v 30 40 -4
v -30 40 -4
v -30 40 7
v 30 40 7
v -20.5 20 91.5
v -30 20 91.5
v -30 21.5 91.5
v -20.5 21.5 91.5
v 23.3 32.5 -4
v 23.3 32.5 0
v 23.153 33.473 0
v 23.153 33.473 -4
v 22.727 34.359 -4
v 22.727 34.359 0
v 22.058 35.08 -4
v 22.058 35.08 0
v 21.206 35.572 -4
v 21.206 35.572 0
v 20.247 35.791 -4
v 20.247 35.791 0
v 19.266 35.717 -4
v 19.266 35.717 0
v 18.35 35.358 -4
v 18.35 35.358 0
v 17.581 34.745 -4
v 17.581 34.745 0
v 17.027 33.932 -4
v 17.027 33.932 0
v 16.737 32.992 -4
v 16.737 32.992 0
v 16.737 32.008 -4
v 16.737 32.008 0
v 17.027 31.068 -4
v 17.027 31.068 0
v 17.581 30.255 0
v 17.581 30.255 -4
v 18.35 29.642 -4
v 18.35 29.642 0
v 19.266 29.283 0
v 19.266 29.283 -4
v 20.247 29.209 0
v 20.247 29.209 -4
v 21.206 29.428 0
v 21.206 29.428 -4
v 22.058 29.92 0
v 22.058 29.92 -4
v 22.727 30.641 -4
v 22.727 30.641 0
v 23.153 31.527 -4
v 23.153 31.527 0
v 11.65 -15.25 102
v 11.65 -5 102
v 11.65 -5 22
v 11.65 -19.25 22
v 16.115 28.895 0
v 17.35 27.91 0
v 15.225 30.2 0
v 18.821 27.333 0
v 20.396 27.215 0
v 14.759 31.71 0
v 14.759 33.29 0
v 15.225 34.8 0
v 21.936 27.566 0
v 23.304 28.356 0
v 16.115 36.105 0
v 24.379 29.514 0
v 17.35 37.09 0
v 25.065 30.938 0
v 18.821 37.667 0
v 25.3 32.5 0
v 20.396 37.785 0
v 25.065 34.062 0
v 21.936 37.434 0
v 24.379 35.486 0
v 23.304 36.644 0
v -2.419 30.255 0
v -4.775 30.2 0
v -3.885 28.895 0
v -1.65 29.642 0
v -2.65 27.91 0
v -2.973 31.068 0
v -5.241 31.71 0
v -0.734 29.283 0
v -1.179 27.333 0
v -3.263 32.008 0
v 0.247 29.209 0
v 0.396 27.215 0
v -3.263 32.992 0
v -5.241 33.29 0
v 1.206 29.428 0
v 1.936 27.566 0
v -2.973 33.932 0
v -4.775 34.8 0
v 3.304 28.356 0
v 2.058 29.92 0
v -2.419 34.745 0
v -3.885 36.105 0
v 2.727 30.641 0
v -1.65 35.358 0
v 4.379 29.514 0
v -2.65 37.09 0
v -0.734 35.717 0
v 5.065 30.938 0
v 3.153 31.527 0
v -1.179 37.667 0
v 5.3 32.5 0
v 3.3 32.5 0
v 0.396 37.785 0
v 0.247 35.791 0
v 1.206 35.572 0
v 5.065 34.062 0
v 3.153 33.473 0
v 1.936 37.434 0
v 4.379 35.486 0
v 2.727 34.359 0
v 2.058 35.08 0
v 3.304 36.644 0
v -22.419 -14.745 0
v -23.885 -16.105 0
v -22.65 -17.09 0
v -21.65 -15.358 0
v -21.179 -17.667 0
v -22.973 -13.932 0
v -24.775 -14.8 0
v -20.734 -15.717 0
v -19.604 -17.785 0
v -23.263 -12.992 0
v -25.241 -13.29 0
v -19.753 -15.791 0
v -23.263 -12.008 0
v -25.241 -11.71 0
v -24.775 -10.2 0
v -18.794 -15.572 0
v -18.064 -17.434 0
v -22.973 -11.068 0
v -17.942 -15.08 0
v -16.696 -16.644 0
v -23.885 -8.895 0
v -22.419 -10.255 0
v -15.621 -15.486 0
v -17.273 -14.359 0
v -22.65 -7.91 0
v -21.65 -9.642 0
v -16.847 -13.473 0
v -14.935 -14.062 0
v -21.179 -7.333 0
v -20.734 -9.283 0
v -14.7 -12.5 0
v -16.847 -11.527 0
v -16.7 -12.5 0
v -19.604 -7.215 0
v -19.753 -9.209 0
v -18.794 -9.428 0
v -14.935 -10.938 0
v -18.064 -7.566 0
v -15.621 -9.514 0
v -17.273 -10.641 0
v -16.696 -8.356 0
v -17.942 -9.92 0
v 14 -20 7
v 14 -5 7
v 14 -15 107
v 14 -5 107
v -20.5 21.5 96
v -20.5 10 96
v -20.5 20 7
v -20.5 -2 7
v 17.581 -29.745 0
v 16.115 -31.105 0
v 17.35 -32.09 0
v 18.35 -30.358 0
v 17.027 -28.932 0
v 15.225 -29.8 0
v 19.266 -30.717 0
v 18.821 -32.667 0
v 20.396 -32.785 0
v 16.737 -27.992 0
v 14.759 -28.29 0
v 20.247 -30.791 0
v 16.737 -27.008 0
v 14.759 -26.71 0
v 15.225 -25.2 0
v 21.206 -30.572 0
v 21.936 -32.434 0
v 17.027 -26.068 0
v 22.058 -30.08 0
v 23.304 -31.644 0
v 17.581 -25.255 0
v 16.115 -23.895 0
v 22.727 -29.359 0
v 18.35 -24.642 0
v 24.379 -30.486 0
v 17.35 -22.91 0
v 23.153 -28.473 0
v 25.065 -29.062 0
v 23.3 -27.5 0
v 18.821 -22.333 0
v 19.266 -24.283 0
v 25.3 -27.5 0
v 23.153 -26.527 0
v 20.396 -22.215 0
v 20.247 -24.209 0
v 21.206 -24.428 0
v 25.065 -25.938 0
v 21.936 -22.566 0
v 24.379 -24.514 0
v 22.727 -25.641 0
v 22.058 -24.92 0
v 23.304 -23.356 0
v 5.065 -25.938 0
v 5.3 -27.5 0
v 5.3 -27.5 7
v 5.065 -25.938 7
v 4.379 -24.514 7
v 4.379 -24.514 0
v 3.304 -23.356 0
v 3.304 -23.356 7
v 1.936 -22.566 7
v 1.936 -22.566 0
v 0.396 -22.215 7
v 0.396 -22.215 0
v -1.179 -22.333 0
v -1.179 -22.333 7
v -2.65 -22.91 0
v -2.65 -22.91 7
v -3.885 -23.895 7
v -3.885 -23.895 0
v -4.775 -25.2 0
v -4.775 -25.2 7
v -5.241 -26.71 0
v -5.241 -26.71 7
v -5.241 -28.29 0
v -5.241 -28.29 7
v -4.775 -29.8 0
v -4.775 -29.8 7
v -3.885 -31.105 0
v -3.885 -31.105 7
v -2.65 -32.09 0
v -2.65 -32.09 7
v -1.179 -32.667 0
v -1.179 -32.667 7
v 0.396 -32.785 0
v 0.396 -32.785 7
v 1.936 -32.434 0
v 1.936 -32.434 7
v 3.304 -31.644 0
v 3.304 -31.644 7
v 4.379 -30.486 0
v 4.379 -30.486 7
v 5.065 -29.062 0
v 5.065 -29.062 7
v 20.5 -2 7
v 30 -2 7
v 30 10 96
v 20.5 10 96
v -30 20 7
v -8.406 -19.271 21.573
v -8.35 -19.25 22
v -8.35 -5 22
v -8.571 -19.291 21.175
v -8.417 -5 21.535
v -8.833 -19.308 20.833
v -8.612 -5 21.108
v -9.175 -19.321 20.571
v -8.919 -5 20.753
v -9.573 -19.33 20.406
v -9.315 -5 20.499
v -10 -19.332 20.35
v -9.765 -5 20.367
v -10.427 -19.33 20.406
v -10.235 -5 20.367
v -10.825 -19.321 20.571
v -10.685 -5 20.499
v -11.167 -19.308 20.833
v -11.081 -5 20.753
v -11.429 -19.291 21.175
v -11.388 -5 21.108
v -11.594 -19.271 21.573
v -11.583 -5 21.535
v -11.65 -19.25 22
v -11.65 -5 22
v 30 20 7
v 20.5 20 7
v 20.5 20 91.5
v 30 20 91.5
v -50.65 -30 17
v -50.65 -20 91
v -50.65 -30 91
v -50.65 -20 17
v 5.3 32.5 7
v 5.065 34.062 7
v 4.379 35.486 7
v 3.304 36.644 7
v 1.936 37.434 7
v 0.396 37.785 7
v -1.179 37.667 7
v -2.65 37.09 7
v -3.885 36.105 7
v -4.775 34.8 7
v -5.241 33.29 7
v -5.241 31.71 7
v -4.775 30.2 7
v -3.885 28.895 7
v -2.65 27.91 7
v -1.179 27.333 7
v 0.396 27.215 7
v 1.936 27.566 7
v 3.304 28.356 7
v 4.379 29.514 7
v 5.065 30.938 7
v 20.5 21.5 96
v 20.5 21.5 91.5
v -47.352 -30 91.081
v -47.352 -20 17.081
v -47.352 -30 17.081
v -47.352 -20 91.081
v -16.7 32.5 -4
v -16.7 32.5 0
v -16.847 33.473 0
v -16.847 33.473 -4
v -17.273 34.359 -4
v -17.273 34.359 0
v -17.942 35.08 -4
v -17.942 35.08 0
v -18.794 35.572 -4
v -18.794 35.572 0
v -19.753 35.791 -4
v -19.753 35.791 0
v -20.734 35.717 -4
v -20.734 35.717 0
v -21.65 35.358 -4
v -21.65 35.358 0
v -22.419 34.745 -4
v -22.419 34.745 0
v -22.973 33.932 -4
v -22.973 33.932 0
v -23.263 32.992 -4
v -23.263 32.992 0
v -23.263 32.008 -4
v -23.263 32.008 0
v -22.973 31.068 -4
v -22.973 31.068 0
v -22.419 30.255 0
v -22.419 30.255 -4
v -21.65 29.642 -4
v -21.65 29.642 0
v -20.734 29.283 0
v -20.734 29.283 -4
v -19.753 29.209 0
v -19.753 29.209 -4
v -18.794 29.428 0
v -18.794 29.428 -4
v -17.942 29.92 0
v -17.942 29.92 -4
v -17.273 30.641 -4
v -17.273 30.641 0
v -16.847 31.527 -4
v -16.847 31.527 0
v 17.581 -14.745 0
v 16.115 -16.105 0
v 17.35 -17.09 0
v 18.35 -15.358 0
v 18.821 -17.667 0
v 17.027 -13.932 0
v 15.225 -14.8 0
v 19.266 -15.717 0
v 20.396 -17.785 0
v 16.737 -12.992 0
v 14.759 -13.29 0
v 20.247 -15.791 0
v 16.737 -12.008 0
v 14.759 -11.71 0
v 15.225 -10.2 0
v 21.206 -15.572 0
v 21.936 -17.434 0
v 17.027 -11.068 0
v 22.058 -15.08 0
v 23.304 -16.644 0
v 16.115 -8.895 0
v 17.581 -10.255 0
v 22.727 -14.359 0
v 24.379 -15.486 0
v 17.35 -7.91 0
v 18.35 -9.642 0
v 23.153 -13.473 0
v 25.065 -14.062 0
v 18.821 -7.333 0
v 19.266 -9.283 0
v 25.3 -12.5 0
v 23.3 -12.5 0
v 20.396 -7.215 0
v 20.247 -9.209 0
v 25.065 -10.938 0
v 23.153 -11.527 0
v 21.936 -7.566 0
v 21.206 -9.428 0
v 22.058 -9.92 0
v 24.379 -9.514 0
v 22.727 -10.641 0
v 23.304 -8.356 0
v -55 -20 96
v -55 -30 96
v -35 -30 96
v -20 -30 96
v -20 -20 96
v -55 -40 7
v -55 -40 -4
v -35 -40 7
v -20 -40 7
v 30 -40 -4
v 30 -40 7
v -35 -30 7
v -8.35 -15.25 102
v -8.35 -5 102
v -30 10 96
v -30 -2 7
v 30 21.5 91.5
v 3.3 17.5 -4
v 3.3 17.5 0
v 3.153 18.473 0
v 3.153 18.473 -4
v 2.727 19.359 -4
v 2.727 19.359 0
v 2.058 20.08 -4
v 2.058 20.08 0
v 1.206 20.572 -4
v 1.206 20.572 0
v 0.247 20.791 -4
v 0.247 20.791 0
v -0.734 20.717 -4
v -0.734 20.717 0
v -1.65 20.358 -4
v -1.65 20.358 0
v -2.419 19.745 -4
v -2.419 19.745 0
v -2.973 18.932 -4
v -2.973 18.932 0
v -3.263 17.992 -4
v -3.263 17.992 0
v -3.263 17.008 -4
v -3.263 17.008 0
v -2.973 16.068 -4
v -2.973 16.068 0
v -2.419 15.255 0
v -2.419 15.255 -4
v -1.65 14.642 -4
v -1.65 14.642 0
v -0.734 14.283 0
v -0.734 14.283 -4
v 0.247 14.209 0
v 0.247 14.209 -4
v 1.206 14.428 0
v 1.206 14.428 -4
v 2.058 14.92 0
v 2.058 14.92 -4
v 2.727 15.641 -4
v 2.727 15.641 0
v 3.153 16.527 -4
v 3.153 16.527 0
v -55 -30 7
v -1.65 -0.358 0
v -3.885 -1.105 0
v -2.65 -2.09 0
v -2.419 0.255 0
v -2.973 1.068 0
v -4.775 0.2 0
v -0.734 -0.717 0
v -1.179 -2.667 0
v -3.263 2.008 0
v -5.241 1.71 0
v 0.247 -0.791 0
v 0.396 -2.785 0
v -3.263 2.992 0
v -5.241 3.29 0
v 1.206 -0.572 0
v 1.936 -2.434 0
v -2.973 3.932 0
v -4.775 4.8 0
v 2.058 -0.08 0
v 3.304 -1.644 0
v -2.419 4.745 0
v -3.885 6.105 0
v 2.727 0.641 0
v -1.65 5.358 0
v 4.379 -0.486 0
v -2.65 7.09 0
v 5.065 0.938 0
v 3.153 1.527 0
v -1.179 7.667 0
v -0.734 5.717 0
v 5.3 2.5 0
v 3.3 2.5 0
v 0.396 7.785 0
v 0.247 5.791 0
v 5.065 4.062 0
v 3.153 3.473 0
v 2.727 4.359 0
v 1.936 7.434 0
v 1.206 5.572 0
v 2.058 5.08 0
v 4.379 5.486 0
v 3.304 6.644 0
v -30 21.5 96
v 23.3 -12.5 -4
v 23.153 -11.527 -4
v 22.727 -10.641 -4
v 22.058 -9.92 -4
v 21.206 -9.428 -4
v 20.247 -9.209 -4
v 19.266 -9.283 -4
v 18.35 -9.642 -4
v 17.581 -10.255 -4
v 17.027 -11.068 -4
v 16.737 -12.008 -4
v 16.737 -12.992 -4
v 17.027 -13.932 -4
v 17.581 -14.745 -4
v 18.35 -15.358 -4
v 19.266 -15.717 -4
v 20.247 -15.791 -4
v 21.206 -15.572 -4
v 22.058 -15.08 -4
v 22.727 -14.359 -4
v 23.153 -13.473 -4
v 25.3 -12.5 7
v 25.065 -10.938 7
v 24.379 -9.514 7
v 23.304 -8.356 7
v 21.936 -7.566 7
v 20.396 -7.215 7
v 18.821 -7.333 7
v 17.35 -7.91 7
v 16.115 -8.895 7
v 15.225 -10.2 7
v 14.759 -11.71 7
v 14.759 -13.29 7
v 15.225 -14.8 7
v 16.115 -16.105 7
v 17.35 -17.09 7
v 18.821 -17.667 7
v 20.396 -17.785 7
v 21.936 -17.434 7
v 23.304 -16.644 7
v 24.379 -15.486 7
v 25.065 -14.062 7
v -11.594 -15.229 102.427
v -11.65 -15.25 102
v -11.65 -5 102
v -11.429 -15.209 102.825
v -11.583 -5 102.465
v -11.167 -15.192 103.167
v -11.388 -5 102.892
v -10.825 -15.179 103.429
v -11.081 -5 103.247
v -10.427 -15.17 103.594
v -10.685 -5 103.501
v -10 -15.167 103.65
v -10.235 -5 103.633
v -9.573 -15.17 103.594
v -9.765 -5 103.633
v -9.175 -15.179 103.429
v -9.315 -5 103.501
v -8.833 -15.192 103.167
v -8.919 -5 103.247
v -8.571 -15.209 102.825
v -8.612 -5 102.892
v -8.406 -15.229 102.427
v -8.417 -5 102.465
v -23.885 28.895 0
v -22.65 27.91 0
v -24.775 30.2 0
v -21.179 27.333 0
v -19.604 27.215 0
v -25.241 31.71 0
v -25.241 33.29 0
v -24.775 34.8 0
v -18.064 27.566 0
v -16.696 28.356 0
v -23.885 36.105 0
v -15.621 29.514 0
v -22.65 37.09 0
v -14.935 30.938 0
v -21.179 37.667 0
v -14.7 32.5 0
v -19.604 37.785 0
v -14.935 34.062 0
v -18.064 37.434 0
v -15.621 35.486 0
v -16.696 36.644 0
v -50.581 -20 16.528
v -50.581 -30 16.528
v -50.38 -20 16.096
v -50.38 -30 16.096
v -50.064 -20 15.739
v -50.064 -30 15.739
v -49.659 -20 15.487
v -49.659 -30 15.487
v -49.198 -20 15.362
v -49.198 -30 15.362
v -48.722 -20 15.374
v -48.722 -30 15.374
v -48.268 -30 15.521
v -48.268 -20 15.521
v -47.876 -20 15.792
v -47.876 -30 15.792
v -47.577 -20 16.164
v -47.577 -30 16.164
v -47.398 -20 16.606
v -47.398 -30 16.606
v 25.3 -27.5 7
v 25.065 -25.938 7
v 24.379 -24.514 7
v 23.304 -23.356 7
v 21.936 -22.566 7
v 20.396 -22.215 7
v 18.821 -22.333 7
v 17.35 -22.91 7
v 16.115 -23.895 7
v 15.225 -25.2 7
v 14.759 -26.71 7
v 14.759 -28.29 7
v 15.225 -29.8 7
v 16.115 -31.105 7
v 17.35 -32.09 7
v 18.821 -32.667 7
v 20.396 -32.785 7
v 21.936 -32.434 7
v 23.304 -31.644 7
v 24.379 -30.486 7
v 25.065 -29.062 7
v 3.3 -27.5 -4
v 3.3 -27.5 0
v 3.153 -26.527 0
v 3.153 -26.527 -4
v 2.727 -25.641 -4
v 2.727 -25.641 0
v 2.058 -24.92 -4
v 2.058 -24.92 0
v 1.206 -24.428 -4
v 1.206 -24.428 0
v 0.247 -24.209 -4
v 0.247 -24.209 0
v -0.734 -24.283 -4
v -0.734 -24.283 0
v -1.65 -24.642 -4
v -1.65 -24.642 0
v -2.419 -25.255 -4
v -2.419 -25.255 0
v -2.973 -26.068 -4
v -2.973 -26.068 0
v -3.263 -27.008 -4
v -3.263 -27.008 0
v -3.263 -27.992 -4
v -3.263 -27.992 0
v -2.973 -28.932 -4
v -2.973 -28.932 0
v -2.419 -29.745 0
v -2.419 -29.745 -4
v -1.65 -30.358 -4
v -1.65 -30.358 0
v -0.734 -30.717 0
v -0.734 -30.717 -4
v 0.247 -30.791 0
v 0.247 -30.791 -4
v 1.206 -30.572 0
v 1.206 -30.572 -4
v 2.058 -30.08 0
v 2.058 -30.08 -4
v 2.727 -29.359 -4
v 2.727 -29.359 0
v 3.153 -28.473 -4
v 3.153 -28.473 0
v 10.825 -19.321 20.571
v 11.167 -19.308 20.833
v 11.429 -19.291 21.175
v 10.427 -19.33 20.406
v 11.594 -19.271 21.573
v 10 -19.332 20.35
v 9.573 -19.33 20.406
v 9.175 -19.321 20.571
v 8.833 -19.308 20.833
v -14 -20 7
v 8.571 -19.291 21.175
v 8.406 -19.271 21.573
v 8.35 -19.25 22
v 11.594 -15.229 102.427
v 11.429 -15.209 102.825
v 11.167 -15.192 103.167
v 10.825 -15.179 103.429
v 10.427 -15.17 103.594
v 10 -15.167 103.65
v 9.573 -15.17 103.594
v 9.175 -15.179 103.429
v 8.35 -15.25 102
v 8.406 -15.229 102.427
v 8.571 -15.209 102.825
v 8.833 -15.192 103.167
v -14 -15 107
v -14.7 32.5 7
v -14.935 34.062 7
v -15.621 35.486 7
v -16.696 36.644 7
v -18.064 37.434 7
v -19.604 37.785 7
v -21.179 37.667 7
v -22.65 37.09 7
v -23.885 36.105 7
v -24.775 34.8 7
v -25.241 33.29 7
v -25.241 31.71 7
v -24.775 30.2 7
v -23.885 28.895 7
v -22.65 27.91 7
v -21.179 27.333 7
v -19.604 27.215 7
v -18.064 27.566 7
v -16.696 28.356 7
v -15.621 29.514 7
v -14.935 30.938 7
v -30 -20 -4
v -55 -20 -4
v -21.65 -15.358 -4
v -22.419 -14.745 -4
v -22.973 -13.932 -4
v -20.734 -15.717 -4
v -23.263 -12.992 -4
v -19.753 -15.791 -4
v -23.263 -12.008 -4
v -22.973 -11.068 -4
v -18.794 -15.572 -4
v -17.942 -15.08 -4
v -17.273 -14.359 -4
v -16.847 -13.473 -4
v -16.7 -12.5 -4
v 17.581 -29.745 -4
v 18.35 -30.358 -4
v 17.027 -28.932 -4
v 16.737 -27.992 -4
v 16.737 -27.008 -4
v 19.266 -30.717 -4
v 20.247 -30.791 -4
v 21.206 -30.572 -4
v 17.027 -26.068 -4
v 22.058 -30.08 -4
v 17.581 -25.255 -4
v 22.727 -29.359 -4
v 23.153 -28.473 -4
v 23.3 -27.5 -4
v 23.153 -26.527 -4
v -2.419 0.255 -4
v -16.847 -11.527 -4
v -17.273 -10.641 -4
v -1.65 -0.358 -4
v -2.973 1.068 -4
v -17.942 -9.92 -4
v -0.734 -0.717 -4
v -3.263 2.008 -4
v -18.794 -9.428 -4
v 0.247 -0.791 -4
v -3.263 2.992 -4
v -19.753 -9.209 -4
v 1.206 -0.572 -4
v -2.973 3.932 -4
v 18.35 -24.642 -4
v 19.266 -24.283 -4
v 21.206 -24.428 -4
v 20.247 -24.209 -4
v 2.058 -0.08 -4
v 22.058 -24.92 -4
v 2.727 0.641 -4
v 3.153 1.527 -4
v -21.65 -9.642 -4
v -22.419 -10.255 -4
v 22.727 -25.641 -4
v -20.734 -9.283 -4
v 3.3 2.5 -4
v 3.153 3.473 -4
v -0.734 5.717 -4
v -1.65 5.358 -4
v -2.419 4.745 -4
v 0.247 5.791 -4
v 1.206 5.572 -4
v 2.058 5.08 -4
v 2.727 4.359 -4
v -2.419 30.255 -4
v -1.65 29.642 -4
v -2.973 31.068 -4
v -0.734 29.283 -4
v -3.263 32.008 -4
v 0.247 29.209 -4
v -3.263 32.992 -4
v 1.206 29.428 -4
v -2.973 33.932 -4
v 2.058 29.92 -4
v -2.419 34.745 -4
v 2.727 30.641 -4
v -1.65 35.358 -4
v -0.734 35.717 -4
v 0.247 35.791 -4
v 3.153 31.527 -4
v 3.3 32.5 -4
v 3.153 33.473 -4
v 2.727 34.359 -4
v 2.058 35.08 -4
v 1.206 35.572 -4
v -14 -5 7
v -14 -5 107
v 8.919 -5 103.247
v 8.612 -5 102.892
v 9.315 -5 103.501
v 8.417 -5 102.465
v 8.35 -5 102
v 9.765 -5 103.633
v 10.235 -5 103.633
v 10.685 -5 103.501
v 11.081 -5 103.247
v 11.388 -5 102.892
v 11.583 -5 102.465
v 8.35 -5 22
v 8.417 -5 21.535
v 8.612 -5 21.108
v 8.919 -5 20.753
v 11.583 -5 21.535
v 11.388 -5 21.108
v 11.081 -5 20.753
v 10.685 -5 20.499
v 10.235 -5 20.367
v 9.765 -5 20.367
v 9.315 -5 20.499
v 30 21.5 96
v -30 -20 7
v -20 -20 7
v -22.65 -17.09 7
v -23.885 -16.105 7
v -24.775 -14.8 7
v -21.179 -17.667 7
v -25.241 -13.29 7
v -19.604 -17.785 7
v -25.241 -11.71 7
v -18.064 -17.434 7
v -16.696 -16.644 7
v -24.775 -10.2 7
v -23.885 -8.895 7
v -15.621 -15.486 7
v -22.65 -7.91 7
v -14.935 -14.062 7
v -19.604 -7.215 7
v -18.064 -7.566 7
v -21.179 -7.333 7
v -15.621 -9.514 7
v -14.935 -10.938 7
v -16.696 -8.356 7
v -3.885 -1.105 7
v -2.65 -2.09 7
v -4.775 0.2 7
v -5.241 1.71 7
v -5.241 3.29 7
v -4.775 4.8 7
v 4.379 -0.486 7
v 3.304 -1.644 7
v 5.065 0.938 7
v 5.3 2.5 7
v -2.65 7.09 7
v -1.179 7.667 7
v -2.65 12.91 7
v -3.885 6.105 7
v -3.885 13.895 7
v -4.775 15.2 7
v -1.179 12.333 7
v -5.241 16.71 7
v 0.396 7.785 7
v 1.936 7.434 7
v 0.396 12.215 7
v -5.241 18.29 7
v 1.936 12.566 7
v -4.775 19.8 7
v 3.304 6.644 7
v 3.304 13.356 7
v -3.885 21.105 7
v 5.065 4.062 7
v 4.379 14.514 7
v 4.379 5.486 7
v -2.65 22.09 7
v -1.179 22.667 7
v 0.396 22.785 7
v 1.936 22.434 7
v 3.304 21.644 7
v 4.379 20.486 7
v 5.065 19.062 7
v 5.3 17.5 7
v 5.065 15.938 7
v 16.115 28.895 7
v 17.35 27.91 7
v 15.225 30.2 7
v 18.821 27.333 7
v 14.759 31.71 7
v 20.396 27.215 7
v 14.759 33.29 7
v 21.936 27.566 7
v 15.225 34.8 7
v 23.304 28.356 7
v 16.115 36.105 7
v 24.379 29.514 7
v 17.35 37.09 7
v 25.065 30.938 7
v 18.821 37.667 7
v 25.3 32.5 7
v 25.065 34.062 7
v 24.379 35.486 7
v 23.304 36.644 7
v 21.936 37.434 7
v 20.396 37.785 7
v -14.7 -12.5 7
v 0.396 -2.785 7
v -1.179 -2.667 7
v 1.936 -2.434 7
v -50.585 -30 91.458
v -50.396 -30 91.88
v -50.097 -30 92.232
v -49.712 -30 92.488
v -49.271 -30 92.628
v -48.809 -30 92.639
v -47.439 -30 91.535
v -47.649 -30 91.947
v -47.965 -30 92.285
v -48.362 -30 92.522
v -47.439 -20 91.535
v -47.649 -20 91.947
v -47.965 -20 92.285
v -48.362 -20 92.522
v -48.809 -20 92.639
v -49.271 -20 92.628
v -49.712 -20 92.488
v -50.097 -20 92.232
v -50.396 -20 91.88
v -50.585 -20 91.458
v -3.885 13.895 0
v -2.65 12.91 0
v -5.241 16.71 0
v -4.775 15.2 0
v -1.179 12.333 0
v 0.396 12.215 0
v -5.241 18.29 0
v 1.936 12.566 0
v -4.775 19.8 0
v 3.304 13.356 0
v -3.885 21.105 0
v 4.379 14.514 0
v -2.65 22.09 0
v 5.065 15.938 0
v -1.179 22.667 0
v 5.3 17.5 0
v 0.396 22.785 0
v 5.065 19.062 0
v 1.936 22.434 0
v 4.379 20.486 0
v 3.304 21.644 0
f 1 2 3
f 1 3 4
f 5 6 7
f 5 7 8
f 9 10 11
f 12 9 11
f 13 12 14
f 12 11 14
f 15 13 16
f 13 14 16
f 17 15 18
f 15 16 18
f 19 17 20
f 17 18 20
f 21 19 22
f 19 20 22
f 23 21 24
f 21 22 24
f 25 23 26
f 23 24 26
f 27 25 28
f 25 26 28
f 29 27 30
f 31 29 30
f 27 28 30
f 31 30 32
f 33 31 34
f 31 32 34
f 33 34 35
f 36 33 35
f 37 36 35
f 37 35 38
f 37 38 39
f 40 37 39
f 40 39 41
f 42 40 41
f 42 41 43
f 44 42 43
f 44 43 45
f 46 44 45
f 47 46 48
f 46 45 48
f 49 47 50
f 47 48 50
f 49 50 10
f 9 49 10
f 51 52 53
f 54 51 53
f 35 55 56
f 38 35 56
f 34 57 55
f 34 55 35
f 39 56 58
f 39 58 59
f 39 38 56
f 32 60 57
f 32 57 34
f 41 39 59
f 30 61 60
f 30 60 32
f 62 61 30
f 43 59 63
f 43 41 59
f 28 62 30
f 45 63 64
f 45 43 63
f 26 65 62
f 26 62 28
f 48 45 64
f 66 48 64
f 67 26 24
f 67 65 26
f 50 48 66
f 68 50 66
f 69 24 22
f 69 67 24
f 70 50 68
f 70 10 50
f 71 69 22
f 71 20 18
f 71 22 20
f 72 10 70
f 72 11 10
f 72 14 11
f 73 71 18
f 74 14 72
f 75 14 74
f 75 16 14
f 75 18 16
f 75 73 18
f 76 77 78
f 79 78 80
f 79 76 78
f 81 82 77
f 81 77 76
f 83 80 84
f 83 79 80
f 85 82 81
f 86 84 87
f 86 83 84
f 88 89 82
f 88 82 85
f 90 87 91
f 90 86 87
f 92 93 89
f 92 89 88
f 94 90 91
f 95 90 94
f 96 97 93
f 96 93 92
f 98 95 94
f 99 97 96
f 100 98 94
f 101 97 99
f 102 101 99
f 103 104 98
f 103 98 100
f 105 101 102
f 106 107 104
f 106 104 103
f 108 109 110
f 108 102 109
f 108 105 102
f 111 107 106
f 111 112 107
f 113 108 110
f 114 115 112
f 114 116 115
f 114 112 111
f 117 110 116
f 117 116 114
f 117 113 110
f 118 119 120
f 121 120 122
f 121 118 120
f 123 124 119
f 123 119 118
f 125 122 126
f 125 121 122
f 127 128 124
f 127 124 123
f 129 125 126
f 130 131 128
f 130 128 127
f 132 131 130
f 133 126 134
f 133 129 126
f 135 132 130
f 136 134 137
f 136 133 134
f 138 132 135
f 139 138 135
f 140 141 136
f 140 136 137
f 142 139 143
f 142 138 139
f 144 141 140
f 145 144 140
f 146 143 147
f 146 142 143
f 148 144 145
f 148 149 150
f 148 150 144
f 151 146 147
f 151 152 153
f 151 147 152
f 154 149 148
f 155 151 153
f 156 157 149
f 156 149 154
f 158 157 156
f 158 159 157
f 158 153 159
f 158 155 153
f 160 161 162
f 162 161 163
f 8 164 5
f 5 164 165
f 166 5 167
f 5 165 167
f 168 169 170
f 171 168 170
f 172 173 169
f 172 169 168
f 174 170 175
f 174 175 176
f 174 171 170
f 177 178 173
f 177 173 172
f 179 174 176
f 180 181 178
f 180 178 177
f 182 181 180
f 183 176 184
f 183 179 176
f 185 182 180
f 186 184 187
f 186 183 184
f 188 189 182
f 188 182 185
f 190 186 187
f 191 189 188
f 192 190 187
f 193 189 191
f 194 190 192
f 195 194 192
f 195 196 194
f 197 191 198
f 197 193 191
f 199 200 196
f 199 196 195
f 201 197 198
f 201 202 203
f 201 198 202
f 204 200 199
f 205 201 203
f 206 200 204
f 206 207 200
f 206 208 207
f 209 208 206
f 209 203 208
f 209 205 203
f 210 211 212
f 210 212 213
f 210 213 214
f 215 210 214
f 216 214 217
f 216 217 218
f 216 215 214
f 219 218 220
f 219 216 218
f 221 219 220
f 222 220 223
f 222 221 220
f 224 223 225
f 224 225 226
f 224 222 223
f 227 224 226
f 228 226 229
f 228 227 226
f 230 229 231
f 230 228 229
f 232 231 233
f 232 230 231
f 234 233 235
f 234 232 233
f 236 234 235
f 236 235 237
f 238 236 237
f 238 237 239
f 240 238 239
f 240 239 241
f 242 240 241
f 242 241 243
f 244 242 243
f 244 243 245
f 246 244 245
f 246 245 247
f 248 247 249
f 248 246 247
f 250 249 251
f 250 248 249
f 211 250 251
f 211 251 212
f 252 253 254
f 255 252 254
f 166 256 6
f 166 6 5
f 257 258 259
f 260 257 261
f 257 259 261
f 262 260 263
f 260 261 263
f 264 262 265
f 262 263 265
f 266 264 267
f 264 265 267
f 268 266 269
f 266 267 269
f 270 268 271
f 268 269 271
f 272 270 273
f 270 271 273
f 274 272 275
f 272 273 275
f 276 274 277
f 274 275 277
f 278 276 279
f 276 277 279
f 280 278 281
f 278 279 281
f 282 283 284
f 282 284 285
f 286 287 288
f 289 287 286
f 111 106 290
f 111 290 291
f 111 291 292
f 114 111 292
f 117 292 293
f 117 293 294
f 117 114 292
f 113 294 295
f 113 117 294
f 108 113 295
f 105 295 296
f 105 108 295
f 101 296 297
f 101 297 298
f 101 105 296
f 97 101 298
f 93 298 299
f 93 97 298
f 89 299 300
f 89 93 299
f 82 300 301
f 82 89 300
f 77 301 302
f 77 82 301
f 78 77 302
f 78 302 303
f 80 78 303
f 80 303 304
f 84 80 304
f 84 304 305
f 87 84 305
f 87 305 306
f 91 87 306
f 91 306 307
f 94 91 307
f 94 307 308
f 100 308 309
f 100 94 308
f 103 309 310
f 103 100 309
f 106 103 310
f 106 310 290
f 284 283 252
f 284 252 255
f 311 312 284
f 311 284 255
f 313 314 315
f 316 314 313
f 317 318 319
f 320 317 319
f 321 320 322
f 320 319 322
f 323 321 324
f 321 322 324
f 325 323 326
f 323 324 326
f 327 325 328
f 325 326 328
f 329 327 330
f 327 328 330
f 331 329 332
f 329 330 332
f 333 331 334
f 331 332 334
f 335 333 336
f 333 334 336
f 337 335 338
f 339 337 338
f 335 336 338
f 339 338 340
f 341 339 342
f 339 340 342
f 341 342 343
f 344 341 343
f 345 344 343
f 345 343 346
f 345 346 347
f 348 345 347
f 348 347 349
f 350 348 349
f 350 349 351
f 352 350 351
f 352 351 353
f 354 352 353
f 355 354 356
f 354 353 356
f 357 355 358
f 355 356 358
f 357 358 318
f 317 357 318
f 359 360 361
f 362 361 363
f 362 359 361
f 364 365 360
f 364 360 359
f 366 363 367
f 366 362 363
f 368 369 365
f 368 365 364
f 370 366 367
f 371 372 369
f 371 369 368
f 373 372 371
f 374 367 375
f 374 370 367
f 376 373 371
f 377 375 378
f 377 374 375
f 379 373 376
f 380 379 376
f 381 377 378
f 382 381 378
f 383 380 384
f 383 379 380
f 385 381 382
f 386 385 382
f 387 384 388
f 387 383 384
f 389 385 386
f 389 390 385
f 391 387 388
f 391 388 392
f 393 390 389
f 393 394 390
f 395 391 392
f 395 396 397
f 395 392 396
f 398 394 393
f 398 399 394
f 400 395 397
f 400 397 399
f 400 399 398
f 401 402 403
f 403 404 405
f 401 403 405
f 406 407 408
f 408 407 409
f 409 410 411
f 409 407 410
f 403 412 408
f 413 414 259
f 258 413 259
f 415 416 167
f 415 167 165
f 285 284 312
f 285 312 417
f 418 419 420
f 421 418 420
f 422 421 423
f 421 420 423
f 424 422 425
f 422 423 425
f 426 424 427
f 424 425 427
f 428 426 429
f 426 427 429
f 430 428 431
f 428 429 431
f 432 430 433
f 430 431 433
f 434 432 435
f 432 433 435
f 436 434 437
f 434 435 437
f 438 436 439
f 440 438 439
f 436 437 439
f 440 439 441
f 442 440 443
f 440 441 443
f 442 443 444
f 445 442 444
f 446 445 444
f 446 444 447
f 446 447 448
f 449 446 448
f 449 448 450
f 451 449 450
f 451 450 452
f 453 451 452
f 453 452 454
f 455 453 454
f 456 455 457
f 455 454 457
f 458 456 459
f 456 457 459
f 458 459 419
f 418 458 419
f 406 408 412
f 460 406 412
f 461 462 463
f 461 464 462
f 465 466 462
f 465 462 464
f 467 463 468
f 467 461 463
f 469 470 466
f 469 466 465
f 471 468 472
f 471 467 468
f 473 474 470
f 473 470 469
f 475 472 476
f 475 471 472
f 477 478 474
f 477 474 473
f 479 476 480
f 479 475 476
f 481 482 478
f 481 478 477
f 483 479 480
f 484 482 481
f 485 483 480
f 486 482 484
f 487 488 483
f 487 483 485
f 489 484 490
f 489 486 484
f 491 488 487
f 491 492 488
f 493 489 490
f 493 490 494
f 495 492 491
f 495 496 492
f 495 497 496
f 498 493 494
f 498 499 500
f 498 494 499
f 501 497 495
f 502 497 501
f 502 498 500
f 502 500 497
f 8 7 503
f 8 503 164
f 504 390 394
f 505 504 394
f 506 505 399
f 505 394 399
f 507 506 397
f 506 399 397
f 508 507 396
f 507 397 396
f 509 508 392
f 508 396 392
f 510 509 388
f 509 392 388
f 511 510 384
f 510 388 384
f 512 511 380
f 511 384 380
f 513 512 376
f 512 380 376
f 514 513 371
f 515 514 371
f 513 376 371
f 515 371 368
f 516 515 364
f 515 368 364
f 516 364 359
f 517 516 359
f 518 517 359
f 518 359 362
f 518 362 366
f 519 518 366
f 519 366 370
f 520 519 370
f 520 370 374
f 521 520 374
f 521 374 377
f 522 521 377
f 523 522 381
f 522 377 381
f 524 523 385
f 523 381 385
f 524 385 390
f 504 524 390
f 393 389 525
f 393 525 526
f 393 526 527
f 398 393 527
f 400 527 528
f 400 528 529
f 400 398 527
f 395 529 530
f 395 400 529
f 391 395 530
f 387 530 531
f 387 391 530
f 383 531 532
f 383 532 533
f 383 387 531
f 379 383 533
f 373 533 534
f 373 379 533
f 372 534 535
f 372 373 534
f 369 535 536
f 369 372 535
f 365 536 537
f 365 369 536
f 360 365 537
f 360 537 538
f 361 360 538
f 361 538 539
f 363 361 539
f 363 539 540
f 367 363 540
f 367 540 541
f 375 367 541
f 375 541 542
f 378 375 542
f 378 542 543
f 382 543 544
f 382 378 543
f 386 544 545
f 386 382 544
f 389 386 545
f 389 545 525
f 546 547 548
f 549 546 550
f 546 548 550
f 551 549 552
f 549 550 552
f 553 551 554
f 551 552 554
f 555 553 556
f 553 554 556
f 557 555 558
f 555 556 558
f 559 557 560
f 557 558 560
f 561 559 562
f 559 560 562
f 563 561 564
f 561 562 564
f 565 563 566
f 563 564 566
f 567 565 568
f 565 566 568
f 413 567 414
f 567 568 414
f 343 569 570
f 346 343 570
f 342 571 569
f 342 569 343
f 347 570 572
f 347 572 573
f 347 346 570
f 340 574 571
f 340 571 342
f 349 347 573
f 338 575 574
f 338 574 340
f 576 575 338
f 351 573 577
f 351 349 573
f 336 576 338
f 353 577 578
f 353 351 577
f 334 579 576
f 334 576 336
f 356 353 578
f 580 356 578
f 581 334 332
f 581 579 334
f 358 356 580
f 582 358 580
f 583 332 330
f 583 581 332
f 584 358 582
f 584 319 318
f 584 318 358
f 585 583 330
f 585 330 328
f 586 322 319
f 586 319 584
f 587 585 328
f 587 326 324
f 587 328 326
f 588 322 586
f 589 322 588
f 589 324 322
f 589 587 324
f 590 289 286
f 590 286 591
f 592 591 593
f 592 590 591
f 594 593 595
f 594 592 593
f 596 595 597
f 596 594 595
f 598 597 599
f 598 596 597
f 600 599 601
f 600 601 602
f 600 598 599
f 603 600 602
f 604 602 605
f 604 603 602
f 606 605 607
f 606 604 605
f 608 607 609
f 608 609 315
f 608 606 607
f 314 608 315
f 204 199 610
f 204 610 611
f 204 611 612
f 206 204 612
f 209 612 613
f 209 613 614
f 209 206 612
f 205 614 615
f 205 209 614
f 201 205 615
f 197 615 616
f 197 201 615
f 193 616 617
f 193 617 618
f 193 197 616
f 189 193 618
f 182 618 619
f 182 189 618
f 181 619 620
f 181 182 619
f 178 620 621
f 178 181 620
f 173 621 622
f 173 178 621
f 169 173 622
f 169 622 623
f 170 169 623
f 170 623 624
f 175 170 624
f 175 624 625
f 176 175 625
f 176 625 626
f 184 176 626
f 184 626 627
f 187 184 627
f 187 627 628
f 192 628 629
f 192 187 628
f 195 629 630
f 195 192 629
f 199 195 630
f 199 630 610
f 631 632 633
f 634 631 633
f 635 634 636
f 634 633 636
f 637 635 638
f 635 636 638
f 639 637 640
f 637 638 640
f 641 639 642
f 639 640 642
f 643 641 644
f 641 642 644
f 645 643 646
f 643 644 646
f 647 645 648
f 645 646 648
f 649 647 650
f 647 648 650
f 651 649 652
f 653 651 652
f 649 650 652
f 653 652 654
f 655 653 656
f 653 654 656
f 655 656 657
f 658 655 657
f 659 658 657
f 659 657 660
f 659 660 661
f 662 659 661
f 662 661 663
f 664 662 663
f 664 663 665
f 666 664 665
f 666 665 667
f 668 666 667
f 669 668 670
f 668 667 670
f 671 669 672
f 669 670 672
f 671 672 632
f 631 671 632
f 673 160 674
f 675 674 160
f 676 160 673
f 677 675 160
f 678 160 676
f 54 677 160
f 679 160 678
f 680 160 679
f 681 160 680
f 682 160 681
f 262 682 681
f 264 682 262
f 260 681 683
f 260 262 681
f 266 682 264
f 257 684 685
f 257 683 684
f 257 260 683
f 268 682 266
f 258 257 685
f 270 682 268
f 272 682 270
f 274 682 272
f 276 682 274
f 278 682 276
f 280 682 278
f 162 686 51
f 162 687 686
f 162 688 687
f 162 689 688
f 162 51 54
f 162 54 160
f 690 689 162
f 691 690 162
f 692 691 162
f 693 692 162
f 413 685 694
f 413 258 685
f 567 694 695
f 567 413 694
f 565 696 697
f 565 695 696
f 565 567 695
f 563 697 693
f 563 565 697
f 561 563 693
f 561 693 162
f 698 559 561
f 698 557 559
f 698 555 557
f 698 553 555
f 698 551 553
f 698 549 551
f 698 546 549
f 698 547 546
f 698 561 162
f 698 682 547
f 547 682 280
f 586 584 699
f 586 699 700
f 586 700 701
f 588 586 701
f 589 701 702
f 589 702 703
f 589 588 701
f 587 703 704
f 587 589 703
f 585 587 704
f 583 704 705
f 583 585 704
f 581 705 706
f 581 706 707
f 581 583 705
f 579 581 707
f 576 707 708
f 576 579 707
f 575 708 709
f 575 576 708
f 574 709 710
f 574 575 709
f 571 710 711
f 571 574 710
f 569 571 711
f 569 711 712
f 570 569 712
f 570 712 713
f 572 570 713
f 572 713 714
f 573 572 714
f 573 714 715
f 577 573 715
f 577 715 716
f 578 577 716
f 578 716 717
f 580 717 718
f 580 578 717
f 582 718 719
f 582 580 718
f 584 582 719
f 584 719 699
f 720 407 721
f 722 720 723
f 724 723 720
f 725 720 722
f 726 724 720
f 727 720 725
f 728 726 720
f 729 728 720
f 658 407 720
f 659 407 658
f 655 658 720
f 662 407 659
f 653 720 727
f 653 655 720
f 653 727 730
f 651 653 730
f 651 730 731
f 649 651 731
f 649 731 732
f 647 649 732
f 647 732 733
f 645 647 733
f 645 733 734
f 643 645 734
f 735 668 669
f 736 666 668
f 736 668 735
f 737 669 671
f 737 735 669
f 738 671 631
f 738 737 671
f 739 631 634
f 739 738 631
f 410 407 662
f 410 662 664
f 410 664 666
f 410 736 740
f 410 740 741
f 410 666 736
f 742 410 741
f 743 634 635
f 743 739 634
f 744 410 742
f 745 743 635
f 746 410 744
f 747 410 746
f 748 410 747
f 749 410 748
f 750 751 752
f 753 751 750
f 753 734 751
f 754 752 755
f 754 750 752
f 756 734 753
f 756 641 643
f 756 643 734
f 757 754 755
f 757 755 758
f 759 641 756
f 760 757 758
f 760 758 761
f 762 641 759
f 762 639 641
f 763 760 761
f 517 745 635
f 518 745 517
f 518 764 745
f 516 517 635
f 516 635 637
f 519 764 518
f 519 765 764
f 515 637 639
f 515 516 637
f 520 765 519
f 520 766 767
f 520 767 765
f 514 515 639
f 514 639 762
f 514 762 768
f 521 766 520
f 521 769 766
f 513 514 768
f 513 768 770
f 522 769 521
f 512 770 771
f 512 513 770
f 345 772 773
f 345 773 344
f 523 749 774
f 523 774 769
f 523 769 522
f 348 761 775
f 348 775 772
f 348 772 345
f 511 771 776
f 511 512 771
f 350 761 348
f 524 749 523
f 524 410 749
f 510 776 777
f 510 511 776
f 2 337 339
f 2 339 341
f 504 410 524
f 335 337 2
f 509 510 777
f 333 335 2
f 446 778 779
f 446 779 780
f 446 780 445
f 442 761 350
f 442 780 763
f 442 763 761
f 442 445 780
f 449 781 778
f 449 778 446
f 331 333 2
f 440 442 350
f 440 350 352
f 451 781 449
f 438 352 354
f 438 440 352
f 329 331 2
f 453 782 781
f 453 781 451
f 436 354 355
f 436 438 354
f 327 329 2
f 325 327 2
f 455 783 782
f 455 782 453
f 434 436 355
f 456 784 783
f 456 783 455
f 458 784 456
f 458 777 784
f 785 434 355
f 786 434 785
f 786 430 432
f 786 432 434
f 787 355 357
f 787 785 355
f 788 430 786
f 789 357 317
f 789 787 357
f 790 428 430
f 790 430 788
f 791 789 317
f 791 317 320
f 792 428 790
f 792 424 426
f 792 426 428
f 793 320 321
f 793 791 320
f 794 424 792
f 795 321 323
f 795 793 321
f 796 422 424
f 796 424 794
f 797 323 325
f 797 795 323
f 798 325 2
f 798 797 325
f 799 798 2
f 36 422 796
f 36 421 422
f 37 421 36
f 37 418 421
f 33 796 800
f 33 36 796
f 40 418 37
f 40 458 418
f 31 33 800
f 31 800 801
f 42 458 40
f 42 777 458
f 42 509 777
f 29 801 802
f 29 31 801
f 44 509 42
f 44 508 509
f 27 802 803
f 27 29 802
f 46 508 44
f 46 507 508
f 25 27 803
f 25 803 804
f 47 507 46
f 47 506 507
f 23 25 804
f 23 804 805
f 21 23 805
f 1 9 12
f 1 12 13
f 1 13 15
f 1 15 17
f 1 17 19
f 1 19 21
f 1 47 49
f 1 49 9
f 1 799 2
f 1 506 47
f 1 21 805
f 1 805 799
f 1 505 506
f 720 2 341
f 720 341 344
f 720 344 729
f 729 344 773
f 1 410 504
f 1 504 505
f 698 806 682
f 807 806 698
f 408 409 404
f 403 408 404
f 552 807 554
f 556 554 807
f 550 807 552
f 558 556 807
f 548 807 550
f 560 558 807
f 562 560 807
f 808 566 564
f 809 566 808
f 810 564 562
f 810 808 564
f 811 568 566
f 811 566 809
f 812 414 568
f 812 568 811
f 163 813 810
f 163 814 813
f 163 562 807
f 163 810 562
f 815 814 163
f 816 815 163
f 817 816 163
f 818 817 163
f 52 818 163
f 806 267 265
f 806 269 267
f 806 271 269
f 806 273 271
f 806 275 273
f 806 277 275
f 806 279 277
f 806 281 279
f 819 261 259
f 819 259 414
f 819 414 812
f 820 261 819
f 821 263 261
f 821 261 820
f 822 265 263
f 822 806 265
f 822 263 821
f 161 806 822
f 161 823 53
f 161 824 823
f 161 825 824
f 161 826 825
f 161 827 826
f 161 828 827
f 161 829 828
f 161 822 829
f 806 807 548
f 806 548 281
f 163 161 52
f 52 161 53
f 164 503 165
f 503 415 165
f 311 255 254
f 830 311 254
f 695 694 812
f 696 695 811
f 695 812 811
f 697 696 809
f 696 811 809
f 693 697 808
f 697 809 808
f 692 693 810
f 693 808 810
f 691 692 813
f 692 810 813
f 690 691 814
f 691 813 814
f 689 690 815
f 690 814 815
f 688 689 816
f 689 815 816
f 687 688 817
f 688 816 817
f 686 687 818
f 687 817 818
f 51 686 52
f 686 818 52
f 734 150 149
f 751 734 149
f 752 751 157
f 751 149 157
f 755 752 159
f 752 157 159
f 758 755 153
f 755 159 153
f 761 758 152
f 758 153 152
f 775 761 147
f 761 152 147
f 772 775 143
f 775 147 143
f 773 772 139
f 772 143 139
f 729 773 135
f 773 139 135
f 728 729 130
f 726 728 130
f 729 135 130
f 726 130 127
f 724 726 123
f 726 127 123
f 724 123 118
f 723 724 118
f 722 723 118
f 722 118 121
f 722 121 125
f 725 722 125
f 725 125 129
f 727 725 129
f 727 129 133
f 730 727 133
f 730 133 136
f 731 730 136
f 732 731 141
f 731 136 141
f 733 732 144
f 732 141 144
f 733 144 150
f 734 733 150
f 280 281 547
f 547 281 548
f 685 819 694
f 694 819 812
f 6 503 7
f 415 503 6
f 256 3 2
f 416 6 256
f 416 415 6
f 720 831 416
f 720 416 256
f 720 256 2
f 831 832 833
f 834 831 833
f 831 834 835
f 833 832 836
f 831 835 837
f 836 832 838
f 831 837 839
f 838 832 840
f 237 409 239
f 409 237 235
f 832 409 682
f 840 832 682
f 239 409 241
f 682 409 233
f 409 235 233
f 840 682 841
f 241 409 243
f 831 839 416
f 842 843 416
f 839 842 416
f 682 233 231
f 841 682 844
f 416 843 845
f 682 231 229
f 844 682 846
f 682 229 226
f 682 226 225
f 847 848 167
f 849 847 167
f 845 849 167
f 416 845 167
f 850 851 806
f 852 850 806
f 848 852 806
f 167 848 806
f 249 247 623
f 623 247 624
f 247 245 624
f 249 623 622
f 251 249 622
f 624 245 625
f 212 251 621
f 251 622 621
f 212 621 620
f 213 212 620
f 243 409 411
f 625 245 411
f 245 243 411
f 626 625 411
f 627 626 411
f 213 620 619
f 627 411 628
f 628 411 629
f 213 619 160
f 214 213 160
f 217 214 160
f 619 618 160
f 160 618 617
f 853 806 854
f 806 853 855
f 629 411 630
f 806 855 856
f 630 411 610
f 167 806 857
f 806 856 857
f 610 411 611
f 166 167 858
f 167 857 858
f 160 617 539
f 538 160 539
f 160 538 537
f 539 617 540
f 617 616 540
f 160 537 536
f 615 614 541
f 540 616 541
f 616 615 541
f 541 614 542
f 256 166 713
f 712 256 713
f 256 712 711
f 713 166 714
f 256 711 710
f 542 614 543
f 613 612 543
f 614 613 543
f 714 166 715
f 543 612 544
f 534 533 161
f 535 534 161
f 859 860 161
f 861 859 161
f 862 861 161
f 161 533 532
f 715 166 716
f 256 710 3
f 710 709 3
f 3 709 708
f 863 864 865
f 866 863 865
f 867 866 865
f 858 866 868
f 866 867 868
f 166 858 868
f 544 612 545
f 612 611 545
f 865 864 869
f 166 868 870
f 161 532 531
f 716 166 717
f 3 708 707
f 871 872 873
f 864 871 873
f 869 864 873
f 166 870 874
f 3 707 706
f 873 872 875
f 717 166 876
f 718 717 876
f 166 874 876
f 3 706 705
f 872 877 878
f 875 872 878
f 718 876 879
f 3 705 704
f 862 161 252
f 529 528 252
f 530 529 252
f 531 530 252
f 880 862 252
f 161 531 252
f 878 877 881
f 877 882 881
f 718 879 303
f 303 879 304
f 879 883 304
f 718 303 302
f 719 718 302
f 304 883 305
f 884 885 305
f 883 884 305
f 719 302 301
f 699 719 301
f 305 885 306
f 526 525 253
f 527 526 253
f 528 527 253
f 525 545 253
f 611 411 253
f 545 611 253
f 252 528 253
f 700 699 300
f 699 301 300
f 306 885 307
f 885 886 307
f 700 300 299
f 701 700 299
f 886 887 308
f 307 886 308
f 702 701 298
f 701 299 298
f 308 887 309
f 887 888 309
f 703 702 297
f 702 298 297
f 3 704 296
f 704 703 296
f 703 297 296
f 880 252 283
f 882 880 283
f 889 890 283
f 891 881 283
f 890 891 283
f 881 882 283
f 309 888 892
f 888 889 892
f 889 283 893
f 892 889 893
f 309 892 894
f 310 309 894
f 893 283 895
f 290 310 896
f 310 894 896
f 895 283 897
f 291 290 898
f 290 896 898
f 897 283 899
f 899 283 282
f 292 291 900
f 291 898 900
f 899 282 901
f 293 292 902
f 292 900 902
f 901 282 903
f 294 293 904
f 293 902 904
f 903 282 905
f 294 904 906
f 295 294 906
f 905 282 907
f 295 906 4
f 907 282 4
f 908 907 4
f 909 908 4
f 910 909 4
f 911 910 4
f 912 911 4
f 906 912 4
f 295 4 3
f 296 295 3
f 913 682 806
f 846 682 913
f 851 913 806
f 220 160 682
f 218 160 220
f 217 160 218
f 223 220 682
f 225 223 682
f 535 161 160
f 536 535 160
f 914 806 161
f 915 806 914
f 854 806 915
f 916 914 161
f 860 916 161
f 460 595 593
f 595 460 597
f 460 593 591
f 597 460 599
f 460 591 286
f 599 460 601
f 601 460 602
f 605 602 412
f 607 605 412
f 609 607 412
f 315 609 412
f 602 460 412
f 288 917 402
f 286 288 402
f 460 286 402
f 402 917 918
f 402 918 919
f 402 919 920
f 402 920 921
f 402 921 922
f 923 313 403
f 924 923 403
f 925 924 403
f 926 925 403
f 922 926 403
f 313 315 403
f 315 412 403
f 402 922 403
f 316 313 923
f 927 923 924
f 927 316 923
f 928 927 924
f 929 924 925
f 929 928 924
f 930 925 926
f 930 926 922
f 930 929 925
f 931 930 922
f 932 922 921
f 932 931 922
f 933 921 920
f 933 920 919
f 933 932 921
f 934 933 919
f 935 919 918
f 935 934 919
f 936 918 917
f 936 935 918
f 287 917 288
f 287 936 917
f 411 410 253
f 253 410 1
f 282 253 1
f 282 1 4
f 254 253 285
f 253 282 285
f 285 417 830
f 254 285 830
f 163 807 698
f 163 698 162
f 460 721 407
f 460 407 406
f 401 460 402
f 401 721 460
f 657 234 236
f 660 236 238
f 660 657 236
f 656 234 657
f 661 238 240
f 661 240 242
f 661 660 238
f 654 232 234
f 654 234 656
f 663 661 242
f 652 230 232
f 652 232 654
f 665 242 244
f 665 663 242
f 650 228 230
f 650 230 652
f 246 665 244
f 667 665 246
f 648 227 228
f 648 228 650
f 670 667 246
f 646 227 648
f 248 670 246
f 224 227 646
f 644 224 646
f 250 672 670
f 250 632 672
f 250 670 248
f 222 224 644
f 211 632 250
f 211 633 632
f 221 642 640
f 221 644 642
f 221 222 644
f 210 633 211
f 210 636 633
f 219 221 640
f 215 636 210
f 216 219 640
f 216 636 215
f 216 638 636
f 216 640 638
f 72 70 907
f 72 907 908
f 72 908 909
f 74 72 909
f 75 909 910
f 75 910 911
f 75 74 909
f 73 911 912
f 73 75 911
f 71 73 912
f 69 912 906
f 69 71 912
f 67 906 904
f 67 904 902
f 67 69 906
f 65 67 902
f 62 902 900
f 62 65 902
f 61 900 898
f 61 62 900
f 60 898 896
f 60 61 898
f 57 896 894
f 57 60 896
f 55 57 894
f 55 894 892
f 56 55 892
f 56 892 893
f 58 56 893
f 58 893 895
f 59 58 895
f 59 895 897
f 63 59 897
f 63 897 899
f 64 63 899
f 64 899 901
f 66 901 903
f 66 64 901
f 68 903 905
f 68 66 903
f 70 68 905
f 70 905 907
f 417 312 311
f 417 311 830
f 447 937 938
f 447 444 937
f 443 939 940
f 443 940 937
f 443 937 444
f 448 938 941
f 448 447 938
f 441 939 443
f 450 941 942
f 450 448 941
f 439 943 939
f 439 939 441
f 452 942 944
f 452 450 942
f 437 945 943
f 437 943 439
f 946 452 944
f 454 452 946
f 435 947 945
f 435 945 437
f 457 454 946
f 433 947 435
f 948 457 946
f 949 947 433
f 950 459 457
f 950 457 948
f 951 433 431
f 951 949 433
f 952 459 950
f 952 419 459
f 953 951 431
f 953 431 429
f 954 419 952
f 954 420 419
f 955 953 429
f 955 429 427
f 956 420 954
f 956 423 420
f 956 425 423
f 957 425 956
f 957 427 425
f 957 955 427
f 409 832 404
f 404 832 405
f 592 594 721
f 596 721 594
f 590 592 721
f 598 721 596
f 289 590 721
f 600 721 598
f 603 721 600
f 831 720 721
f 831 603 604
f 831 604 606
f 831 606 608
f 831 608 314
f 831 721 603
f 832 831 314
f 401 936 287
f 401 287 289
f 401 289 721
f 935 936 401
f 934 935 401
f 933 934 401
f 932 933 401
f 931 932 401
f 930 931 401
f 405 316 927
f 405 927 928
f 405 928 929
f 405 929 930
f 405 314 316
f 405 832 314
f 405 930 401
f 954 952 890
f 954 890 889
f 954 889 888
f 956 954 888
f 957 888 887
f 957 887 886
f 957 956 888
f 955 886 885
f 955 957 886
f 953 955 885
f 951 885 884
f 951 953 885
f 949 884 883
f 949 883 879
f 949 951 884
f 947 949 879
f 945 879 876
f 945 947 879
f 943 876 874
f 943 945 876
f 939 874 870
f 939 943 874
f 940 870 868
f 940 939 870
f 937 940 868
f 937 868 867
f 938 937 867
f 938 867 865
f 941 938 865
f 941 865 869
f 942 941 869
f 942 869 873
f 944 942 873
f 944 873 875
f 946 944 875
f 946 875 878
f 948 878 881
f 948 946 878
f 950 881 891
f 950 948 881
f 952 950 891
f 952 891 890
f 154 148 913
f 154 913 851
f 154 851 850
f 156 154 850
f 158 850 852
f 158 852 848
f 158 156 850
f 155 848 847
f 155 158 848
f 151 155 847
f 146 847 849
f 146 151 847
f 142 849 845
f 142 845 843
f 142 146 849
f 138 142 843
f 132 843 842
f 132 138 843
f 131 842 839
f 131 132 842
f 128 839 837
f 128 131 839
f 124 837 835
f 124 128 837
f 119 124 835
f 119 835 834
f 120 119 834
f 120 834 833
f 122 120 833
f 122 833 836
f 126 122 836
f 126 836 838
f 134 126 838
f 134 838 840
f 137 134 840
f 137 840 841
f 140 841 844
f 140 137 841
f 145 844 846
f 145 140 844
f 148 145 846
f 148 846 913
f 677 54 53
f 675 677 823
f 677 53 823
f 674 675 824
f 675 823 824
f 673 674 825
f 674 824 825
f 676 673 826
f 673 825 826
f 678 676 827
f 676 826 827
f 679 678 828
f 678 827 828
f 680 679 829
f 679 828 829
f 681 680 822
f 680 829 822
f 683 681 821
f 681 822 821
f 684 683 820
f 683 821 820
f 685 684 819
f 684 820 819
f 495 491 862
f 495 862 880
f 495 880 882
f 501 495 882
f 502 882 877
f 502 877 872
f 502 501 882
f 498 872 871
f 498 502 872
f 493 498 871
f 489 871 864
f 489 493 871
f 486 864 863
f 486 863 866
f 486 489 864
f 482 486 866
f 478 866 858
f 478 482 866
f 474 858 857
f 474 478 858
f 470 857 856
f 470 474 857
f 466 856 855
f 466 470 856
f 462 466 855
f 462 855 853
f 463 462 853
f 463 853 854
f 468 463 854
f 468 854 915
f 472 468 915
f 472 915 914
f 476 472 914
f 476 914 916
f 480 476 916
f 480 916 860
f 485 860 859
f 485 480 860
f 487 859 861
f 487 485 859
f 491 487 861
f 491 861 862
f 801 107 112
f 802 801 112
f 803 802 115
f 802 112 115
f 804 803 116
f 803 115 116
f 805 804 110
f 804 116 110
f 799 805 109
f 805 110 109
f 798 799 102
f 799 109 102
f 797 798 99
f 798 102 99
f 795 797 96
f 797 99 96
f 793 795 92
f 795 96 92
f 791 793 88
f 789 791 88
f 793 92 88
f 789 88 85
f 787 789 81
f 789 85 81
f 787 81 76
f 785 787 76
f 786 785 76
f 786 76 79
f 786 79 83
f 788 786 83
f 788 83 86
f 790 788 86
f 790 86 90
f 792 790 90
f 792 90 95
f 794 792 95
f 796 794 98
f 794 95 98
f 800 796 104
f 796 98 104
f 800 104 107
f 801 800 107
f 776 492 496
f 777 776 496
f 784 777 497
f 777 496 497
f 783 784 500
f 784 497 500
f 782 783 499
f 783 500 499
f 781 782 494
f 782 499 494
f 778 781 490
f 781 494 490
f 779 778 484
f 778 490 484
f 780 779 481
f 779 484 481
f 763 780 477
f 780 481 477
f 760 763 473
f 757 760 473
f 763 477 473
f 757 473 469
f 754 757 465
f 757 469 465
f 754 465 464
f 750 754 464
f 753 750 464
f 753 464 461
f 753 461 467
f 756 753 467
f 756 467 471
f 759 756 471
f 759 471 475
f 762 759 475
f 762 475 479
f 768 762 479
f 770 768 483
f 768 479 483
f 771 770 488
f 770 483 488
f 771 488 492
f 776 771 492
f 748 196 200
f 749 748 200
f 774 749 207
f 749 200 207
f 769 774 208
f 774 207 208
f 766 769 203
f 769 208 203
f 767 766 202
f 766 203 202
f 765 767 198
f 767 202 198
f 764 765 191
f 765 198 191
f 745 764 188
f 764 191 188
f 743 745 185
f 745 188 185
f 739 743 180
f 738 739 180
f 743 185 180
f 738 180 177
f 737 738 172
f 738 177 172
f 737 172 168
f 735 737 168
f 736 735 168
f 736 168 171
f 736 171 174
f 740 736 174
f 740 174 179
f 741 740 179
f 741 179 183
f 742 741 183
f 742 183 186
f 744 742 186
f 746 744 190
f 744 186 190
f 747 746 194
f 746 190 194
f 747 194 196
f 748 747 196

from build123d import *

# Parameters (mm, degrees)
SKETCH1_W                 = 60
SKETCH1_H                 = 80
SKETCH1_R                 = 3.3
BOSS_EXTRUDE1_DEPTH       = 4
SKETCH3_W                 = 60
SKETCH3_H                 = 80
SKETCH3_R                 = 5.3
BOSS_EXTRUDE2_DEPTH       = 7
SKETCH4_W                 = 9.5
SKETCH4_H                 = 10
BOSS_EXTRUDE3_DEPTH       = 89
BOSS_EXTRUDE4_DEPTH       = 9.5
BOSS_EXTRUDE5_DEPTH       = 9.5
SKETCH7_W                 = 9.5
SKETCH7_H                 = 4.5
BOSS_EXTRUDE6_DEPTH       = 1.5
SKETCH9_W                 = 28
SKETCH9_H                 = 10
BOSS_EXTRUDE7_DEPTH       = 100
BOSS_EXTRUDE9_DEPTH       = 28
CUT_EXTRUDE1_DEPTH        = 18
BOSS_EXTRUDE10_DEPTH      = 25
BOSS_EXTRUDE10_DEPTH_BACK = 10
SKETCH13_W                = 100
SKETCH13_H                = 10
SKETCH14_W                = 11
SKETCH14_H                = 20
BOSS_EXTRUDE11_DEPTH      = 25
CUT_EXTRUDE2_DEPTH        = 10
BOSS_EXTRUDE12_DEPTH      = 15


with BuildPart() as part:
    # Sketch1 → Boss-Extrude1 (new body)
    with BuildSketch(Plane.XY):
        Rectangle(SKETCH1_W, SKETCH1_H)
        with Locations((-20, -12.5)):
            Circle(SKETCH1_R, mode=Mode.SUBTRACT)
        with Locations((20, -12.5)):
            Circle(SKETCH1_R, mode=Mode.SUBTRACT)
        with Locations((0, 17.5)):
            Circle(SKETCH1_R, mode=Mode.SUBTRACT)
        with Locations((0, 2.5)):
            Circle(SKETCH1_R, mode=Mode.SUBTRACT)
        with Locations((20, 32.5)):
            Circle(SKETCH1_R, mode=Mode.SUBTRACT)
        with Locations((0, 32.5)):
            Circle(SKETCH1_R, mode=Mode.SUBTRACT)
        with Locations((-20, 32.5)):
            Circle(SKETCH1_R, mode=Mode.SUBTRACT)
        with Locations((0, -27.5)):
            Circle(SKETCH1_R, mode=Mode.SUBTRACT)
        with Locations((20, -27.5)):
            Circle(SKETCH1_R, mode=Mode.SUBTRACT)
    extrude(amount=-BOSS_EXTRUDE1_DEPTH)

    # Sketch3 → Boss-Extrude2 (add)
    with BuildSketch(Plane.XY):
        Rectangle(SKETCH3_W, SKETCH3_H)
        with Locations((0, 17.5)):
            Circle(SKETCH3_R, mode=Mode.SUBTRACT)
        with Locations((-20, -12.5)):
            Circle(SKETCH3_R, mode=Mode.SUBTRACT)
        with Locations((20, -12.5)):
            Circle(SKETCH3_R, mode=Mode.SUBTRACT)
        with Locations((0, 2.5)):
            Circle(SKETCH3_R, mode=Mode.SUBTRACT)
        with Locations((-20, 32.5)):
            Circle(SKETCH3_R, mode=Mode.SUBTRACT)
        with Locations((0, 32.5)):
            Circle(SKETCH3_R, mode=Mode.SUBTRACT)
        with Locations((20, 32.5)):
            Circle(SKETCH3_R, mode=Mode.SUBTRACT)
        with Locations((0, -27.5)):
            Circle(SKETCH3_R, mode=Mode.SUBTRACT)
        with Locations((20, -27.5)):
            Circle(SKETCH3_R, mode=Mode.SUBTRACT)
    extrude(amount=BOSS_EXTRUDE2_DEPTH)

    # Sketch4 → Boss-Extrude3 (add)
    with BuildSketch(Plane.XY.offset(7)):
        with Locations((-25.25, 15)):
            Rectangle(SKETCH4_W, SKETCH4_H)
        with Locations((25.25, 15)):
            Rectangle(SKETCH4_W, SKETCH4_H)
    extrude(amount=BOSS_EXTRUDE3_DEPTH)

    # Sketch5 → Boss-Extrude4 (add)
    with BuildSketch(Plane(origin=(30, 0, 0), x_dir=(0, 0, -1), z_dir=(1, 0, 0))):
        Polygon((-96, 10), (-7, 10), (-7, -2), align=None)
    extrude(amount=-BOSS_EXTRUDE4_DEPTH)

    # Sketch6 → Boss-Extrude5 (add)
    with BuildSketch(Plane.ZY.offset(30)):
        Polygon((96, 10), (7, 10), (7, -2), align=None)
    extrude(amount=-BOSS_EXTRUDE5_DEPTH)

    # Sketch7 → Boss-Extrude6 (add)
    with BuildSketch(Plane(origin=(0, 20, 0), x_dir=(1, 0, 0), z_dir=(0, 1, 0))):
        with Locations((-25.25, -93.75)):
            Rectangle(SKETCH7_W, SKETCH7_H)
        with Locations((25.25, -93.75)):
            Rectangle(SKETCH7_W, SKETCH7_H)
    extrude(amount=BOSS_EXTRUDE6_DEPTH)

    # Sketch9 → Boss-Extrude7 (add)
    with BuildSketch(Plane.XY.offset(7)):
        with Locations((0, -10)):
            Rectangle(SKETCH9_W, SKETCH9_H)
    extrude(amount=BOSS_EXTRUDE7_DEPTH)

    # Sketch11 → Boss-Extrude9 (add)
    with BuildSketch(Plane.ZY.offset(14)):
        Polygon((107, -15), (7, -15), (7, -20), align=None)
    extrude(amount=-BOSS_EXTRUDE9_DEPTH)

    # Sketch12 → Cut-Extrude1 (cut)
    with BuildSketch(Plane(origin=(0, -5, 0), x_dir=(1, 0, 0), z_dir=(0, 1, 0))):
        with BuildLine():
            Line((-11.65, -22), (-11.65, -102))
            ThreePointArc((-11.65, -102), (-10, -103.65), (-8.35, -102))
            Line((-8.35, -102), (-8.35, -22))
            ThreePointArc((-8.35, -22), (-10, -20.35), (-11.65, -22))
        make_face()
        with BuildLine():
            Line((8.35, -22), (8.35, -102))
            ThreePointArc((8.35, -102), (10, -103.65), (11.65, -102))
            Line((11.65, -102), (11.65, -22))
            ThreePointArc((11.65, -22), (10, -20.35), (8.35, -22))
        make_face()
    extrude(amount=-CUT_EXTRUDE1_DEPTH, mode=Mode.SUBTRACT)



with BuildPart() as body_2:
    # Sketch13 → Boss-Extrude10 (new, two sides: drawn at the far end of the back side and taken through both)
    with BuildSketch(Plane.ZY.offset(30).offset(-BOSS_EXTRUDE10_DEPTH_BACK)):
        with Locations((46, -25)):
            Rectangle(SKETCH13_W, SKETCH13_H)
    extrude(amount=BOSS_EXTRUDE10_DEPTH + BOSS_EXTRUDE10_DEPTH_BACK)


with BuildPart() as part_1:
    add(part.part)

    add(body_2.part)  # Boss-Extrude11 merges body 2
    # Sketch14 → Boss-Extrude11 (add)
    with BuildSketch(Plane.ZY.offset(30)):
        with Locations((1.5, -30)):
            Rectangle(SKETCH14_W, SKETCH14_H)
    extrude(amount=BOSS_EXTRUDE11_DEPTH)

    # Sketch15 → Cut-Extrude2 (cut)
    with BuildSketch(Plane(origin=(0, -20, 0), x_dir=(1, 0, 0), z_dir=(0, 1, 0))):
        with BuildLine():
            Line((-50.65, -91), (-50.65, -17))
            ThreePointArc((-50.65, -17), (-48.959530594, -15.350496369), (-47.351985179, -17.080914463))
            Line((-47.351985179, -17.080914463), (-47.351985179, -91.080914463))
            ThreePointArc((-47.351985179, -91.080914463), (-49.040469406, -92.649503631), (-50.65, -91))
        make_face()
    extrude(amount=-CUT_EXTRUDE2_DEPTH, mode=Mode.SUBTRACT)

    # Sketch16 → Boss-Extrude12 (add)
    with BuildSketch(Plane(origin=(-20, 0, 0), x_dir=(0, 0, -1), z_dir=(1, 0, 0))):
        Polygon((-96, -30), (-7, -30), (-7, -40), align=None)
    extrude(amount=-BOSS_EXTRUDE12_DEPTH)


solid = part_1.part
